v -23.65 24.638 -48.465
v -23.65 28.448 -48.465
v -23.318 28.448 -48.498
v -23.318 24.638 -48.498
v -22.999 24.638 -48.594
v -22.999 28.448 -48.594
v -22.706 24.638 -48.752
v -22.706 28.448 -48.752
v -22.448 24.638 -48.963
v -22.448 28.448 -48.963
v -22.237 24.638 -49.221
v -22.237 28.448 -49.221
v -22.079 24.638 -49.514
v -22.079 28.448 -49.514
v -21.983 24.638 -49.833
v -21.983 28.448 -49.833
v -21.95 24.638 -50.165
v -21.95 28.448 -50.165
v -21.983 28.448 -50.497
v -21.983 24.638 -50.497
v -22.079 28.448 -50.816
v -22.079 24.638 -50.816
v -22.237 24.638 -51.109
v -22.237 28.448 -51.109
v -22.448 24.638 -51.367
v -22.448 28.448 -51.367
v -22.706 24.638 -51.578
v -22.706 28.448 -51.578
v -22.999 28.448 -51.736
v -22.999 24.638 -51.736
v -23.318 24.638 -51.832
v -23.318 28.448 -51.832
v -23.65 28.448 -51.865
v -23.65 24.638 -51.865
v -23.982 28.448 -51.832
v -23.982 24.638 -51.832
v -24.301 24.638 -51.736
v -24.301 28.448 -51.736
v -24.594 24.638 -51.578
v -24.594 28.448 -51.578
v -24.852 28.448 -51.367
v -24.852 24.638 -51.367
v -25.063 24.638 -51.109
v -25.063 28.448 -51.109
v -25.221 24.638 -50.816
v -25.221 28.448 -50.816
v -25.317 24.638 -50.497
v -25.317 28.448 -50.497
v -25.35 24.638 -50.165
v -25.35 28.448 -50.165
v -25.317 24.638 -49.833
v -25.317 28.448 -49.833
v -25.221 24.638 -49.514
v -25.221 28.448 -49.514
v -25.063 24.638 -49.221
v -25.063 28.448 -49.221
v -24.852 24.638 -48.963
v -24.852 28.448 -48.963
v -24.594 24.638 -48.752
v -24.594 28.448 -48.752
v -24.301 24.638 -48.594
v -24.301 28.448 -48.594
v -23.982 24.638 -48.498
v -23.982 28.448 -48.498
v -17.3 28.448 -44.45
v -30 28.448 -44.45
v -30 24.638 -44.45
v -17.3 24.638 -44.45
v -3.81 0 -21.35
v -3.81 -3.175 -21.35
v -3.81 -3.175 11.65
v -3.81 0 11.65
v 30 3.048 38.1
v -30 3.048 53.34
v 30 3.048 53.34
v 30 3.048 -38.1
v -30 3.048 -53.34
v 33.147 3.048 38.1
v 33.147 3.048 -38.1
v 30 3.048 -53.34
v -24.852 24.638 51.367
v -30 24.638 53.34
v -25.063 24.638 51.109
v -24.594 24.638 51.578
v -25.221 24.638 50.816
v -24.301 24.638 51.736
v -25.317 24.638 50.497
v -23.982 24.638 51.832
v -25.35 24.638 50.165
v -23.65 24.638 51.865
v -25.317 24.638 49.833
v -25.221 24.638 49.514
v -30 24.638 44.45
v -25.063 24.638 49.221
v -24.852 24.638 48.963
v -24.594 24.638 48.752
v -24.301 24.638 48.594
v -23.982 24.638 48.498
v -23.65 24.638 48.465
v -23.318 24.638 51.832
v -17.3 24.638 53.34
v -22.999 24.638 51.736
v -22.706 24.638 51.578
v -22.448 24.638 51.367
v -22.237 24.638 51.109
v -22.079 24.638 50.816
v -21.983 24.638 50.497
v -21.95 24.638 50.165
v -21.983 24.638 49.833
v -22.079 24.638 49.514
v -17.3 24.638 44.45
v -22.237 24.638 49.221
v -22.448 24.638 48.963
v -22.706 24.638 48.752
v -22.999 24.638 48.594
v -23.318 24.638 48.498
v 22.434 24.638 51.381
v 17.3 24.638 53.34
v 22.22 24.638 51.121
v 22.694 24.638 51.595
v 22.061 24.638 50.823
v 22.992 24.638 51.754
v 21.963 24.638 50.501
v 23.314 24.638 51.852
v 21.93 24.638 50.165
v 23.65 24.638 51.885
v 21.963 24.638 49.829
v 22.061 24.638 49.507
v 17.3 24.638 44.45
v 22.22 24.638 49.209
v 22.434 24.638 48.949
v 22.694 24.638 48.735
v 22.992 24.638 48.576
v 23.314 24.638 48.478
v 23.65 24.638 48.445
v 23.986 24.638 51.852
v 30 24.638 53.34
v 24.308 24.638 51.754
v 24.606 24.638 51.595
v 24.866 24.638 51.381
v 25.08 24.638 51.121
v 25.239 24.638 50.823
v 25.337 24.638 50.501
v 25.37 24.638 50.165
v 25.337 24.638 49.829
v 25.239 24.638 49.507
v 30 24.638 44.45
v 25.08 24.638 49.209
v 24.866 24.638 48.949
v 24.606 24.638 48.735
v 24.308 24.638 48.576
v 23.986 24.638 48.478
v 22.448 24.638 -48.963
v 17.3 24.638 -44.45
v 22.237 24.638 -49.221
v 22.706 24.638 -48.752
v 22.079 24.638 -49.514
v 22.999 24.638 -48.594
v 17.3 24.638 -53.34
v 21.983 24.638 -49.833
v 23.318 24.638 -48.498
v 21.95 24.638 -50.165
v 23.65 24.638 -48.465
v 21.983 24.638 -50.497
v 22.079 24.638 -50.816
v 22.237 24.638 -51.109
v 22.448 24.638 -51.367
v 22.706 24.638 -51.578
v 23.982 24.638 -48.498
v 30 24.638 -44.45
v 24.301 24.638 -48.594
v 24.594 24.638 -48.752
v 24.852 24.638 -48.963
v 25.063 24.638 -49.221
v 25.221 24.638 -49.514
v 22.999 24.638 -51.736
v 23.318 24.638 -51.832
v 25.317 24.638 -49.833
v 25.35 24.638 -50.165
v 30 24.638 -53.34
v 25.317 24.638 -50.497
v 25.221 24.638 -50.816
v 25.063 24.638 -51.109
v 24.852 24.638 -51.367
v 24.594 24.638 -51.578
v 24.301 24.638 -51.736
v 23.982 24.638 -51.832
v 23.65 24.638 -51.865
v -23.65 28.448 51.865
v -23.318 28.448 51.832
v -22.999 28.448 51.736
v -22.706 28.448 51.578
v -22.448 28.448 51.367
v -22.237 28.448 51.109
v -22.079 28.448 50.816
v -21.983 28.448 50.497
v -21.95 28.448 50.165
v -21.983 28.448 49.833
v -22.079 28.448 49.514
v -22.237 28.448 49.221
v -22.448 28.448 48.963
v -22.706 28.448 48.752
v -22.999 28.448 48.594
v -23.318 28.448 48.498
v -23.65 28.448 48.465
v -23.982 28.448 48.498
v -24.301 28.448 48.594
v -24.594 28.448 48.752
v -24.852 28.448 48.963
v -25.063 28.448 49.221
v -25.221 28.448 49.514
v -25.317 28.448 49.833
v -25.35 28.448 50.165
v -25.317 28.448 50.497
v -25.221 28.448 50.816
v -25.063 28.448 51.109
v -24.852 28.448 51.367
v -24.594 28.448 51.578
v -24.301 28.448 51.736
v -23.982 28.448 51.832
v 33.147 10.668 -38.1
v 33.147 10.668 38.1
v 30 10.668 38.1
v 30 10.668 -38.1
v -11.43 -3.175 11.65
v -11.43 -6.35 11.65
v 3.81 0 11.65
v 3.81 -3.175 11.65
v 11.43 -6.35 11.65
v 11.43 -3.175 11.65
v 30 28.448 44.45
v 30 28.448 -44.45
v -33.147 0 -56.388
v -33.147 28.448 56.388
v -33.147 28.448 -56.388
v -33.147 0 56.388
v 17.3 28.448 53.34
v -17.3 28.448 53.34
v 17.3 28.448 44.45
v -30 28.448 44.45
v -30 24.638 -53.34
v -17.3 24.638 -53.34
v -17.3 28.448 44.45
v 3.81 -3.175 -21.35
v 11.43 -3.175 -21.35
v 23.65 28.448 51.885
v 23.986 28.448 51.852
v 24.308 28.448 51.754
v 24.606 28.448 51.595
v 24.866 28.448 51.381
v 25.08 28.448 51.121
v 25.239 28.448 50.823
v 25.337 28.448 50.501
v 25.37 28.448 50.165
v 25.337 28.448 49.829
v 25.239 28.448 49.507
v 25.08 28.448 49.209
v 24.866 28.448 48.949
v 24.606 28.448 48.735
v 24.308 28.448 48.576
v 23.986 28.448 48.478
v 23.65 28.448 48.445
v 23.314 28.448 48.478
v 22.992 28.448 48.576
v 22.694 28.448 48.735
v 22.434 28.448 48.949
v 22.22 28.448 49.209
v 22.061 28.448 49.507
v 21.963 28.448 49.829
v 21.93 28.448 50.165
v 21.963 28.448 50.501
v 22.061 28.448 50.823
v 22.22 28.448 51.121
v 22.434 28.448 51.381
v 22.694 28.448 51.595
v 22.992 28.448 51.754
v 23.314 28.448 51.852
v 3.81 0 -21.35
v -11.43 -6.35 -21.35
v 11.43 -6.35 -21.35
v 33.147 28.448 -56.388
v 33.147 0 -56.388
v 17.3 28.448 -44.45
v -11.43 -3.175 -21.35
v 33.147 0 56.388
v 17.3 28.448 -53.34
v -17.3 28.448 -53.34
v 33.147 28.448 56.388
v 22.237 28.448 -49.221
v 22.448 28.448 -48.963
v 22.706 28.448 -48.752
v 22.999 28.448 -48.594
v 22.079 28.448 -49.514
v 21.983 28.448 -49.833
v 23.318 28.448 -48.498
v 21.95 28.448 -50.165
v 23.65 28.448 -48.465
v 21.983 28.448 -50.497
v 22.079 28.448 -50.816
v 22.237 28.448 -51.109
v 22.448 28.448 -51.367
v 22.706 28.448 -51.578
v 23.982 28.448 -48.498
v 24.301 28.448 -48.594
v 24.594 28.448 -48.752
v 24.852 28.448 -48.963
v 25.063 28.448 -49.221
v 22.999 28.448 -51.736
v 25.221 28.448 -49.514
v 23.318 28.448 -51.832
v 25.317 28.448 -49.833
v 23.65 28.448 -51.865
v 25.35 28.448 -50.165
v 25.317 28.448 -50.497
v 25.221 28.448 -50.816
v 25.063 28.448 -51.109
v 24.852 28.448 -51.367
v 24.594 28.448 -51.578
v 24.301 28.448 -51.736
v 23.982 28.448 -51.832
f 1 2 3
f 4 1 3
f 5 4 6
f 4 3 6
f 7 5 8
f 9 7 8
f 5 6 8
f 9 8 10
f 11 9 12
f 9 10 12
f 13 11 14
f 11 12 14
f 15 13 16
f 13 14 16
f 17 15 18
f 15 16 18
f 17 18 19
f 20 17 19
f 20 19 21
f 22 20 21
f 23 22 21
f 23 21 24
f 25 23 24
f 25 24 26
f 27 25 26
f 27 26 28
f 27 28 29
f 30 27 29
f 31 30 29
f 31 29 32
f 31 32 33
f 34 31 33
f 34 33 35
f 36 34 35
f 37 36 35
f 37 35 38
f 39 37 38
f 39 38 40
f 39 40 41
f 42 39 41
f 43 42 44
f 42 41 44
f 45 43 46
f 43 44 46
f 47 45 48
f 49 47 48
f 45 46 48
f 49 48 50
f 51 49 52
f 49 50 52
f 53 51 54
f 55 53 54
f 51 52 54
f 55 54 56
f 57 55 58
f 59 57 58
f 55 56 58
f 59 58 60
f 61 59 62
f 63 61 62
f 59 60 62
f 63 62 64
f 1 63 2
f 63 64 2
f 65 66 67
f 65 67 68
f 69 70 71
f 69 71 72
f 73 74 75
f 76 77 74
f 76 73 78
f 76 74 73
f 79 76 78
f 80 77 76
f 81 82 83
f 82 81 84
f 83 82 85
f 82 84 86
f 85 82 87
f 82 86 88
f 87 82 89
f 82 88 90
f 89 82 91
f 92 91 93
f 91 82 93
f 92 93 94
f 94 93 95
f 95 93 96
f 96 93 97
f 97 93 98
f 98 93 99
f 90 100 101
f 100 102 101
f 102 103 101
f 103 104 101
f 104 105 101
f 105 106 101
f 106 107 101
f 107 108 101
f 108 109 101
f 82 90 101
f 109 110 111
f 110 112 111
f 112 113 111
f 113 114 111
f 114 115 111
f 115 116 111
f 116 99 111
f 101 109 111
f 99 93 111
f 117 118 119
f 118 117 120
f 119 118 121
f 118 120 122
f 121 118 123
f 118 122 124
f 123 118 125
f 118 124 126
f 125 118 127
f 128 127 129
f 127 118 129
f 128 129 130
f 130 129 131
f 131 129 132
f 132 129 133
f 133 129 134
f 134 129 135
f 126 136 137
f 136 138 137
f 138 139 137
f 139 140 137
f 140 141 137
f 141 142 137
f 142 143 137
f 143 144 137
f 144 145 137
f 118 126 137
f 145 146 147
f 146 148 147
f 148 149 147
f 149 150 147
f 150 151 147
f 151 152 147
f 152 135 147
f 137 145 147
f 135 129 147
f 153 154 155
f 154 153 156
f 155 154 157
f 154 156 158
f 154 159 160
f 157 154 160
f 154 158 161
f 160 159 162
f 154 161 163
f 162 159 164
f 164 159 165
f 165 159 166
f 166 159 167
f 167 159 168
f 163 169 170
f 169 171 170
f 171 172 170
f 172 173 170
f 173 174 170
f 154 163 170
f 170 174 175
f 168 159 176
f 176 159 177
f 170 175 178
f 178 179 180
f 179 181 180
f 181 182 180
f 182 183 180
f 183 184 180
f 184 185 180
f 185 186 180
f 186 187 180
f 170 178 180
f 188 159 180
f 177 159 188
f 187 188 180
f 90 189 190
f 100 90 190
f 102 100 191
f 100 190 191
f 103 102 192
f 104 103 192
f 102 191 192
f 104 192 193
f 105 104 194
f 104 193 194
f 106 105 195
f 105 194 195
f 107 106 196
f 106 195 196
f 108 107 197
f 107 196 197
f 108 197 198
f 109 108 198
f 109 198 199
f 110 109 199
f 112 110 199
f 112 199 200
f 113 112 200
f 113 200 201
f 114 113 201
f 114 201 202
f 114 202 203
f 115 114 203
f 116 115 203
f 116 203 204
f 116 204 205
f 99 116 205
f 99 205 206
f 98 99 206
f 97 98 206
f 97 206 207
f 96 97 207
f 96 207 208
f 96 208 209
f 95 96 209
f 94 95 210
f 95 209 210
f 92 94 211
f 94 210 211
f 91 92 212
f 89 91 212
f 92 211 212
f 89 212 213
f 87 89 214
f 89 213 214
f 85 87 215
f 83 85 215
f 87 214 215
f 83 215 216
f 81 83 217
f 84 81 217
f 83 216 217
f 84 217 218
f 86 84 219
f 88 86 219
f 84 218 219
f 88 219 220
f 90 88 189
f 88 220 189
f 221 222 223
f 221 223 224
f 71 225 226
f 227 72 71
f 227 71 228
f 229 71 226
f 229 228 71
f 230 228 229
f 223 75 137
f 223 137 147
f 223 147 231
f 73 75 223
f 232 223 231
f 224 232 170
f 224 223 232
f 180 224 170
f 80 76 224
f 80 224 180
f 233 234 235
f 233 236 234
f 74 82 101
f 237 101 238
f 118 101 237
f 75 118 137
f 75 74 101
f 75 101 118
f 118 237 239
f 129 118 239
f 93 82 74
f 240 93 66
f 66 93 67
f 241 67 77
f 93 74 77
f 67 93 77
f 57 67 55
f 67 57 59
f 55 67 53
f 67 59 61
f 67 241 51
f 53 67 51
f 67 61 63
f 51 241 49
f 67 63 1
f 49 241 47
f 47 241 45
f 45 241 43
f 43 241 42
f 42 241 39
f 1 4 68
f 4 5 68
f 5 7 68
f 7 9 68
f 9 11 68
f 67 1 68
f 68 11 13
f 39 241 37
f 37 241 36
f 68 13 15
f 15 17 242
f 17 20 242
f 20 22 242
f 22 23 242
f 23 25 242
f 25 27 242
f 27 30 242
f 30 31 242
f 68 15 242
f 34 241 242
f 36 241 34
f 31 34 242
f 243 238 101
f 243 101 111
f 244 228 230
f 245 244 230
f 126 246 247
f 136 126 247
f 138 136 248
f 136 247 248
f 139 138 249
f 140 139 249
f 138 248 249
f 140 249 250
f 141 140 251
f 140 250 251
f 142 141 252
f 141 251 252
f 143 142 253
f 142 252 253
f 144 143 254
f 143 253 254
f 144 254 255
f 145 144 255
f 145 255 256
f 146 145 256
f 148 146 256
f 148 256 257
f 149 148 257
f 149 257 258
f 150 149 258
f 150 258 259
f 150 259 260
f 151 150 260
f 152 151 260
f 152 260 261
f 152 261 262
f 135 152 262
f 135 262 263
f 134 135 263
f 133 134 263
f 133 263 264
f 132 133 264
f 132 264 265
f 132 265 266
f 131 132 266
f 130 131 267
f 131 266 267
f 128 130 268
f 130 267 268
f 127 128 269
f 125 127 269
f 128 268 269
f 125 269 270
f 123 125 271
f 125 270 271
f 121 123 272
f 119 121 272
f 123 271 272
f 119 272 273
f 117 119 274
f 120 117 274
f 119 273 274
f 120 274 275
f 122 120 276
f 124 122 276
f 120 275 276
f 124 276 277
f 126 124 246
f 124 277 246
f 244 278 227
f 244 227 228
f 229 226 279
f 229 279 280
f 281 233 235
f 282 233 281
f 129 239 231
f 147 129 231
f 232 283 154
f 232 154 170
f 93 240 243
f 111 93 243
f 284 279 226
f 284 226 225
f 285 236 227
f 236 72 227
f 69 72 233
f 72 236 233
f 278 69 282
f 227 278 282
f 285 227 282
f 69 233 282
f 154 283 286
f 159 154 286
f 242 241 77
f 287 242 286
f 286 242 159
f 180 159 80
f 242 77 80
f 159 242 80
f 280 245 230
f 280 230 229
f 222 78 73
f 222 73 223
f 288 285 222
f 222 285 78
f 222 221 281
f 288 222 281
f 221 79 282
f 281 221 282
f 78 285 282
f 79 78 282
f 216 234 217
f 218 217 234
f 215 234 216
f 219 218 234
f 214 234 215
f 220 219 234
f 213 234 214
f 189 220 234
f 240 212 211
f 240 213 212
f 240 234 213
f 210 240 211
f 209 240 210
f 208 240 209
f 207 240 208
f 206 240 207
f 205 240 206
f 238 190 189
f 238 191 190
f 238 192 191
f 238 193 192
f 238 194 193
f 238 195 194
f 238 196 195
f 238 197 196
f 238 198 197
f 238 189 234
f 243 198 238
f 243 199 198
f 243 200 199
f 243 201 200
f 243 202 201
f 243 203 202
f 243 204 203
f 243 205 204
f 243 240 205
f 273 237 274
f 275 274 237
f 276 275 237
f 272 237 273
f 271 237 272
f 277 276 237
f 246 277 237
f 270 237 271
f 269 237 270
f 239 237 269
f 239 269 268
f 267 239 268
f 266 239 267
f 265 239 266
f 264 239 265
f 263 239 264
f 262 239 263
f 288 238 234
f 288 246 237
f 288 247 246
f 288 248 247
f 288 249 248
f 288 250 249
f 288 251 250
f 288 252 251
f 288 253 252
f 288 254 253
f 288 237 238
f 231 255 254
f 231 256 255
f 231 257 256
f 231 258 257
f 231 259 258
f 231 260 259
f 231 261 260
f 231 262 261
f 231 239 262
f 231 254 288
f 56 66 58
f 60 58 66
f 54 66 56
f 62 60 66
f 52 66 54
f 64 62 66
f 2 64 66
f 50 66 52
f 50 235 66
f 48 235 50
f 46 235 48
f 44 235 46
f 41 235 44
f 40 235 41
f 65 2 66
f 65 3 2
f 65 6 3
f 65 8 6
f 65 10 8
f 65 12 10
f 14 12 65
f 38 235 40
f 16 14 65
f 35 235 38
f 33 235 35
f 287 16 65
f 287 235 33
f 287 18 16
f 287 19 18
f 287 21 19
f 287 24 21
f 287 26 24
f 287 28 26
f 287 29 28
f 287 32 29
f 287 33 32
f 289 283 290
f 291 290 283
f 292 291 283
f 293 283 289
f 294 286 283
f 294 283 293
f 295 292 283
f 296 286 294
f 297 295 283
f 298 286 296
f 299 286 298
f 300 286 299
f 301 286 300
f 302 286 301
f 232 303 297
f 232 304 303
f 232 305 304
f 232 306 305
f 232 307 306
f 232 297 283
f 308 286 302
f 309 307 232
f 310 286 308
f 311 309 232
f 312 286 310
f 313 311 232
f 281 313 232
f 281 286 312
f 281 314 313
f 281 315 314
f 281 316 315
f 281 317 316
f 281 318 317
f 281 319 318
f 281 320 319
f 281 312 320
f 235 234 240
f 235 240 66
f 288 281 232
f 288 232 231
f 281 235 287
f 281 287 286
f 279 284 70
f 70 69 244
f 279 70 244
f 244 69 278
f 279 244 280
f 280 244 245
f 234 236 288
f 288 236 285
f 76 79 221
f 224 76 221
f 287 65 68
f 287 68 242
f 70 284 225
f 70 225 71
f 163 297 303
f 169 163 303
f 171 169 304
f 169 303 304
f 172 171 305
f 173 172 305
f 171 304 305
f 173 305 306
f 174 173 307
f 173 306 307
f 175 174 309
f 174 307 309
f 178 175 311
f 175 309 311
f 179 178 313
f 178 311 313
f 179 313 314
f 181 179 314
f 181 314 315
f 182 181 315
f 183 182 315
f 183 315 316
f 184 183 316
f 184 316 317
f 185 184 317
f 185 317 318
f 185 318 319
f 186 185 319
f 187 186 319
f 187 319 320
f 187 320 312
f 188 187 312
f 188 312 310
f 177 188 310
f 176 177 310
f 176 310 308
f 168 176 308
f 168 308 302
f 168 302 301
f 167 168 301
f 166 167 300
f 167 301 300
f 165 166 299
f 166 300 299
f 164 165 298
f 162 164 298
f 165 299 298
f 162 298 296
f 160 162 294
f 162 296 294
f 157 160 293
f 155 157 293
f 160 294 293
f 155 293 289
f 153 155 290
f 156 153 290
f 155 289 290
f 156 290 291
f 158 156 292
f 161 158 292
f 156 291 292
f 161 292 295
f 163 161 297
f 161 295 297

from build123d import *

# Parameters (mm, degrees)
SKETCH1_W               = 66.294
SKETCH1_H               = 112.776
BOSS_EXTRUDE1_DEPTH     = 3.048
SKETCH2_W               = 66.294
SKETCH2_H               = 112.776
SKETCH2_W_2             = 60
SKETCH2_H_2             = 106.68
BOSS_EXTRUDE2_DEPTH     = 25.4
SKETCH3_W               = 12.7
SKETCH3_H               = 8.89
BOSS_EXTRUDE3_DEPTH     = 3.81
CUT_EXTRUDE1_REACH      = 93.563
SKETCH6_W               = 76.2
SKETCH6_H               = 7.62
SKETCH7_W               = 50.8
SKETCH7_H               = 42.7
BOSS_EXTRUDE4_DEPTH     = 6.35
CUT_EXTRUDE2_DEPTH      = 90.169551737
CUT_EXTRUDE2_DEPTH_BACK = 90.169551737
CUT_EXTRUDE3_START      = -6.35
SKETCH9_W               = 22.86
SKETCH9_H               = 9.7
CUT_EXTRUDE3_DEPTH      = 6.35
CUT_EXTRUDE4_REACH      = 76.089
SKETCH4_R               = 1.7
SKETCH4_R_2             = 1.72


with BuildPart() as part:
    # Sketch1 → Boss-Extrude1 (new body)
    with BuildSketch(Plane(origin=(0, 0, 0), x_dir=(1, 0, 0), z_dir=(0, 1, 0))):
        Rectangle(SKETCH1_W, SKETCH1_H)
    extrude(amount=BOSS_EXTRUDE1_DEPTH)

    # Sketch2 → Boss-Extrude2 (add)
    with BuildSketch(Plane(origin=(0, 3.048, 0), x_dir=(1, 0, 0), z_dir=(0, 1, 0))):
        Rectangle(SKETCH2_W, SKETCH2_H)
        Rectangle(SKETCH2_W_2, SKETCH2_H_2, mode=Mode.SUBTRACT)
    extrude(amount=BOSS_EXTRUDE2_DEPTH)

    # Sketch3 → Boss-Extrude3 (add)
    with BuildSketch(Plane(origin=(0, 28.448, 0), x_dir=(1, 0, 0), z_dir=(0, 1, 0))):
        with Locations((-23.65, 48.895)):
            Rectangle(SKETCH3_W, SKETCH3_H)
        with Locations((-23.65, -48.895)):
            Rectangle(SKETCH3_W, SKETCH3_H)
        with Locations((23.65, 48.895)):
            Rectangle(SKETCH3_W, SKETCH3_H)
        with Locations((23.65, -48.895)):
            Rectangle(SKETCH3_W, SKETCH3_H)
    extrude(amount=-BOSS_EXTRUDE3_DEPTH)

    # Sketch6 → Cut-Extrude1 (cut, up to next)
    with BuildSketch(Plane(origin=(33.147, 0, 0), x_dir=(0, 0, -1), z_dir=(1, 0, 0)), mode=Mode.PRIVATE) as cut_extrude1_sk1:
        with Locations((0, 6.858)):
            Rectangle(SKETCH6_W, SKETCH6_H)
    cut_extrude1_tool1 = extrude(cut_extrude1_sk1.sketch, amount=-CUT_EXTRUDE1_REACH, mode=Mode.PRIVATE) & part.part
    add(cut_extrude1_tool1.solids().sort_by_distance((33.147, 6.858, 0))[0], mode=Mode.SUBTRACT)

    # Sketch7 → Boss-Extrude4 (add)
    with BuildSketch(Plane.XZ):
        Rectangle(SKETCH7_W, SKETCH7_H)
    extrude(amount=BOSS_EXTRUDE4_DEPTH)

    # Sketch8 → Cut-Extrude2 (cut, two sides: drawn at the far end of the back side and taken through both)
    with BuildSketch(Plane.XY.offset(21.35).offset(-CUT_EXTRUDE2_DEPTH_BACK)):
        Polygon((-3.81, -3.175), (-3.81, 0), (-25.4, 0), (-25.4, -6.35), (-11.43, -6.35), (-11.43, -3.175), align=None)
        Polygon((25.4, 0), (3.81, 0), (3.81, -3.175), (11.43, -3.175), (11.43, -6.35), (25.4, -6.35), align=None)
    extrude(amount=CUT_EXTRUDE2_DEPTH + CUT_EXTRUDE2_DEPTH_BACK, mode=Mode.SUBTRACT)

    # Sketch9 → Cut-Extrude3 (cut)
    with BuildSketch(Plane.XZ.offset(6.35).offset(CUT_EXTRUDE3_START)):
        with Locations((0, 16.5)):
            Rectangle(SKETCH9_W, SKETCH9_H)
    extrude(amount=CUT_EXTRUDE3_DEPTH, mode=Mode.SUBTRACT)

    # Sketch4 → Cut-Extrude4 (cut, up to next)
    with BuildSketch(Plane(origin=(0, 28.448, 0), x_dir=(1, 0, 0), z_dir=(0, 1, 0)), mode=Mode.PRIVATE) as cut_extrude4_sk1:
        with Locations(Location((-23.65, 50.165, 0), (0, 0, 270))):
            Circle(SKETCH4_R)
    cut_extrude4_tool1 = extrude(cut_extrude4_sk1.sketch, amount=-CUT_EXTRUDE4_REACH, mode=Mode.PRIVATE) & part.part
    # Sketch4 → Cut-Extrude4 (cut, up to next)
    with BuildSketch(Plane(origin=(0, 28.448, 0), x_dir=(1, 0, 0), z_dir=(0, 1, 0)), mode=Mode.PRIVATE) as cut_extrude4_sk2:
        with Locations(Location((23.65, 50.165, 0), (0, 0, 270))):
            Circle(SKETCH4_R)
    cut_extrude4_tool2 = extrude(cut_extrude4_sk2.sketch, amount=-CUT_EXTRUDE4_REACH, mode=Mode.PRIVATE) & part.part
    # Sketch4 → Cut-Extrude4 (cut, up to next)
    with BuildSketch(Plane(origin=(0, 28.448, 0), x_dir=(1, 0, 0), z_dir=(0, 1, 0)), mode=Mode.PRIVATE) as cut_extrude4_sk3:
        with Locations(Location((23.65, -50.165, 0), (0, 0, 270))):
            Circle(SKETCH4_R_2)
    cut_extrude4_tool3 = extrude(cut_extrude4_sk3.sketch, amount=-CUT_EXTRUDE4_REACH, mode=Mode.PRIVATE) & part.part
    # Sketch4 → Cut-Extrude4 (cut, up to next)
    with BuildSketch(Plane(origin=(0, 28.448, 0), x_dir=(1, 0, 0), z_dir=(0, 1, 0)), mode=Mode.PRIVATE) as cut_extrude4_sk4:
        with Locations(Location((-23.65, -50.165, 0), (0, 0, 270))):
            Circle(SKETCH4_R)
    cut_extrude4_tool4 = extrude(cut_extrude4_sk4.sketch, amount=-CUT_EXTRUDE4_REACH, mode=Mode.PRIVATE) & part.part
    add(cut_extrude4_tool1.solids().sort_by_distance((-23.65, 28.448, -50.165))[0], mode=Mode.SUBTRACT)
    add(cut_extrude4_tool2.solids().sort_by_distance((23.65, 28.448, -50.165))[0], mode=Mode.SUBTRACT)
    add(cut_extrude4_tool3.solids().sort_by_distance((23.65, 28.448, 50.165))[0], mode=Mode.SUBTRACT)
    add(cut_extrude4_tool4.solids().sort_by_distance((-23.65, 28.448, 50.165))[0], mode=Mode.SUBTRACT)


solid = part.part
